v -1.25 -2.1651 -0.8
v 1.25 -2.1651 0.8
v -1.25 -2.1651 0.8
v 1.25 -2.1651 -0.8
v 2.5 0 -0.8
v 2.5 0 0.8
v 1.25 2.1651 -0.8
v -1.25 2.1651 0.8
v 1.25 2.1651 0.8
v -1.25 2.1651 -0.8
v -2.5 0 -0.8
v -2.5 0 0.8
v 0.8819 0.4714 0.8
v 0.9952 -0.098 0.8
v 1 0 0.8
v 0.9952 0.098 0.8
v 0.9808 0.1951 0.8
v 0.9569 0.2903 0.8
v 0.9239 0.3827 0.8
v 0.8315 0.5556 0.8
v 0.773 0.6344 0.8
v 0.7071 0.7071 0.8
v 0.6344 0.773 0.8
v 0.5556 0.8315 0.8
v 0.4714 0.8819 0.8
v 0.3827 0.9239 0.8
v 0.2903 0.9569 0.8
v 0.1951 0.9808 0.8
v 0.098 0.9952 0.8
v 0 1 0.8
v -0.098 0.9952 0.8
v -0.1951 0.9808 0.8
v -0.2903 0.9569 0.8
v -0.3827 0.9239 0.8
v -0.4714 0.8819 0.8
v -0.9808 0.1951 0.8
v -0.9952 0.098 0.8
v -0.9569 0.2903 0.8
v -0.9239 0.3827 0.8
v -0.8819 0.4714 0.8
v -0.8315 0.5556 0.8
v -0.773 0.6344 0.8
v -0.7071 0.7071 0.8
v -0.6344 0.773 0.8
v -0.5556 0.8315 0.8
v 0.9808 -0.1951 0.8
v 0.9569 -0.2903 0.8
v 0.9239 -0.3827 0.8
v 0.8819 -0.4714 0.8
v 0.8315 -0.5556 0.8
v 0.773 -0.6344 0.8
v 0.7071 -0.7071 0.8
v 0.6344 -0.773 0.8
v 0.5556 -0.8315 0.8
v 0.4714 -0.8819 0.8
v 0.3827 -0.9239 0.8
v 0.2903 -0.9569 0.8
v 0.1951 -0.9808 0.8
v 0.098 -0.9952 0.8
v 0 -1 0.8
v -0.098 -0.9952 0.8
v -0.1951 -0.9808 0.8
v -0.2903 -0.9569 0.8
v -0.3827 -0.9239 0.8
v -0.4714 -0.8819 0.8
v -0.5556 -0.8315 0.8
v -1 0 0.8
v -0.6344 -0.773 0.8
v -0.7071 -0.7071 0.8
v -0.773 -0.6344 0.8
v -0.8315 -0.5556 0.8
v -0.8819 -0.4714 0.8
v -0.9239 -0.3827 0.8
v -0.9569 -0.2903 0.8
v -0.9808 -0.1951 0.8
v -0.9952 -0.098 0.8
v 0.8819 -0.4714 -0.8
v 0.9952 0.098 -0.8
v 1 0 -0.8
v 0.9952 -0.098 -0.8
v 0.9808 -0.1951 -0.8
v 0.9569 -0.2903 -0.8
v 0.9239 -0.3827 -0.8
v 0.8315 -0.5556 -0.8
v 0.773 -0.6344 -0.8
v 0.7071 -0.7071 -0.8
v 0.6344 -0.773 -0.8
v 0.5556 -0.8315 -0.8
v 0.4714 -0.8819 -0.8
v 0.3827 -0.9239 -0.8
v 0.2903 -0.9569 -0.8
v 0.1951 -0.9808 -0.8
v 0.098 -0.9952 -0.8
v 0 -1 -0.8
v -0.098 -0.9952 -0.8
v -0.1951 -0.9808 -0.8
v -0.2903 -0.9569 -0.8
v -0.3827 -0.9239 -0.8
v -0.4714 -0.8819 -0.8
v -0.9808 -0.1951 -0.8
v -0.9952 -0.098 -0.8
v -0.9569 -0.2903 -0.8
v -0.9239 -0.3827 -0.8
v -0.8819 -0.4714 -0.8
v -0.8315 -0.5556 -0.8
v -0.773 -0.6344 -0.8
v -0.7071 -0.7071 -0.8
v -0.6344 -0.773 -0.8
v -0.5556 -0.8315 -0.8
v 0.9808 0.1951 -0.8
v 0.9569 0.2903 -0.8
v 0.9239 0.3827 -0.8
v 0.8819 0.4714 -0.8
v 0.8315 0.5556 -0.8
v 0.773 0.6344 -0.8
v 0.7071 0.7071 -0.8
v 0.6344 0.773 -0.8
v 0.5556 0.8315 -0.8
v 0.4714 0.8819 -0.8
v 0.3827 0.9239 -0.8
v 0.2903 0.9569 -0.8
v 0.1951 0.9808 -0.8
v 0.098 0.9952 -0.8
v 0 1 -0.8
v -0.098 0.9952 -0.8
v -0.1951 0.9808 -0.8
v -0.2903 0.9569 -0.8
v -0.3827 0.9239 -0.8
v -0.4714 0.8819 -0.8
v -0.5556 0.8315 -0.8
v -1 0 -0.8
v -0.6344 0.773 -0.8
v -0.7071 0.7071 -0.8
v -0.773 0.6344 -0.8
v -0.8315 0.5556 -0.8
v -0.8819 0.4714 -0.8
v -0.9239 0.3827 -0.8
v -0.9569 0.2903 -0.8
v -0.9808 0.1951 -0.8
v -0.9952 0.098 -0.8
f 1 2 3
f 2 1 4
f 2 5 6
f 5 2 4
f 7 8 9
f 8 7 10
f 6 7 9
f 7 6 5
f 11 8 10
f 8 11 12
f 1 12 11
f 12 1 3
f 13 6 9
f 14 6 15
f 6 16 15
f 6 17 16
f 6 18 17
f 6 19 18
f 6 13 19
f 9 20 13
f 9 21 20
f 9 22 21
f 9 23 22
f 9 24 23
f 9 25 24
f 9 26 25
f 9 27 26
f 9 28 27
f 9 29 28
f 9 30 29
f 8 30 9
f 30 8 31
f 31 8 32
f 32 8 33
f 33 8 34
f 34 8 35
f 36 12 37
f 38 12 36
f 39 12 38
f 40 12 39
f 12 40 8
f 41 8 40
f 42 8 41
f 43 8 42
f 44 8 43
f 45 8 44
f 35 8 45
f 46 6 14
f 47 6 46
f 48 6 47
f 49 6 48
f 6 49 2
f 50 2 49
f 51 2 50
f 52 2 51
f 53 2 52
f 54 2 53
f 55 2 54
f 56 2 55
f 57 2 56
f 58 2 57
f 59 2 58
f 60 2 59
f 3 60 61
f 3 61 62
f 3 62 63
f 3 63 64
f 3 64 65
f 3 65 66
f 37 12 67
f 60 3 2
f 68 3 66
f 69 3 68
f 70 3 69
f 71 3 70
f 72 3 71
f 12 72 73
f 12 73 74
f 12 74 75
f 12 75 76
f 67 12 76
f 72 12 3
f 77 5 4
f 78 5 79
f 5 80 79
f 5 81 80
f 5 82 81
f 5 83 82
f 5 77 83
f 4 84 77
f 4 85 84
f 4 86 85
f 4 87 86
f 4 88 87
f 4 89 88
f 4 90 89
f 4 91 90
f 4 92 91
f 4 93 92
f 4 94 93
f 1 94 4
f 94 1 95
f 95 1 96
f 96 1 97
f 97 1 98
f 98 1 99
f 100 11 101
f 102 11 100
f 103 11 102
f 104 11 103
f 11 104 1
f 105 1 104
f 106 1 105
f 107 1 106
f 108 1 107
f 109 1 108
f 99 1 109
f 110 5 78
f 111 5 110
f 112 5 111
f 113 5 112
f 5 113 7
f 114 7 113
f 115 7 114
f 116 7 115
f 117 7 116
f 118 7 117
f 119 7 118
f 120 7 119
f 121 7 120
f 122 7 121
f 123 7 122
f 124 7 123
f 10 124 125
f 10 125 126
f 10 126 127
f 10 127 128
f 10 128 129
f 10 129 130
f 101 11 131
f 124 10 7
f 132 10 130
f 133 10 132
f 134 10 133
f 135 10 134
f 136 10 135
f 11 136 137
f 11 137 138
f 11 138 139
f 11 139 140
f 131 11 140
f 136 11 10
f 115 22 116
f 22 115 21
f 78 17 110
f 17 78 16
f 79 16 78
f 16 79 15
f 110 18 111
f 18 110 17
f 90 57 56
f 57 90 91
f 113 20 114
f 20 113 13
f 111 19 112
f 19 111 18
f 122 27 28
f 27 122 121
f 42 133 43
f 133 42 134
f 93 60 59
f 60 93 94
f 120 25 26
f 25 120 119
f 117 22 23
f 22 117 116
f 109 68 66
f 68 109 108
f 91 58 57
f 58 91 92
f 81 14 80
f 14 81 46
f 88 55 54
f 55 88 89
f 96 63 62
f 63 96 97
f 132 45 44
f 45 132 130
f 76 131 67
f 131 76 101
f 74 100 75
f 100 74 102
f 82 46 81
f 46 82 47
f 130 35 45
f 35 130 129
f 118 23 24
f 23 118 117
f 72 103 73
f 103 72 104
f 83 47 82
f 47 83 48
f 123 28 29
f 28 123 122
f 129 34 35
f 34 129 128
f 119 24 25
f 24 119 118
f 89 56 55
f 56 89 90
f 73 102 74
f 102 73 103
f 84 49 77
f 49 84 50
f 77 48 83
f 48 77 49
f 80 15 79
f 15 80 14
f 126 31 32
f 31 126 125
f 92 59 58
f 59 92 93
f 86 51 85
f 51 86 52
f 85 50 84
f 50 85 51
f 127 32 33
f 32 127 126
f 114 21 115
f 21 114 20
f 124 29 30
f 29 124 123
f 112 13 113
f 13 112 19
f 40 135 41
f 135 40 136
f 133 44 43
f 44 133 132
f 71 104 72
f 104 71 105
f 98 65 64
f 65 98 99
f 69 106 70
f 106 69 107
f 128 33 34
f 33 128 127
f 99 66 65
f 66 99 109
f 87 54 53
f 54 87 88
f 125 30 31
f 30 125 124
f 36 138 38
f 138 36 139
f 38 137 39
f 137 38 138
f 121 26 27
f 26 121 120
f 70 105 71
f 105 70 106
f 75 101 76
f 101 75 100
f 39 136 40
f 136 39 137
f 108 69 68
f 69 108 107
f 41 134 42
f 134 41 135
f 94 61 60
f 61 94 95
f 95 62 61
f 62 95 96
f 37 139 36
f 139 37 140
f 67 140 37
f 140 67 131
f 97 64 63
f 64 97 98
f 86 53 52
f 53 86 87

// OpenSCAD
$fn = 64;

module hex_nut() {
    difference() {
        // Create a hexagonal prism for the nut
        cylinder(h = 1.6, r = 2.5, $fn = 6, center = true);
        // Subtract the cylindrical thread bore
        translate([0, 0, -0.8])
            cylinder(h = 3.2, r = 1, $fn = 64);
    }
}

// Call the hex_nut module to render the nut
hex_nut();
